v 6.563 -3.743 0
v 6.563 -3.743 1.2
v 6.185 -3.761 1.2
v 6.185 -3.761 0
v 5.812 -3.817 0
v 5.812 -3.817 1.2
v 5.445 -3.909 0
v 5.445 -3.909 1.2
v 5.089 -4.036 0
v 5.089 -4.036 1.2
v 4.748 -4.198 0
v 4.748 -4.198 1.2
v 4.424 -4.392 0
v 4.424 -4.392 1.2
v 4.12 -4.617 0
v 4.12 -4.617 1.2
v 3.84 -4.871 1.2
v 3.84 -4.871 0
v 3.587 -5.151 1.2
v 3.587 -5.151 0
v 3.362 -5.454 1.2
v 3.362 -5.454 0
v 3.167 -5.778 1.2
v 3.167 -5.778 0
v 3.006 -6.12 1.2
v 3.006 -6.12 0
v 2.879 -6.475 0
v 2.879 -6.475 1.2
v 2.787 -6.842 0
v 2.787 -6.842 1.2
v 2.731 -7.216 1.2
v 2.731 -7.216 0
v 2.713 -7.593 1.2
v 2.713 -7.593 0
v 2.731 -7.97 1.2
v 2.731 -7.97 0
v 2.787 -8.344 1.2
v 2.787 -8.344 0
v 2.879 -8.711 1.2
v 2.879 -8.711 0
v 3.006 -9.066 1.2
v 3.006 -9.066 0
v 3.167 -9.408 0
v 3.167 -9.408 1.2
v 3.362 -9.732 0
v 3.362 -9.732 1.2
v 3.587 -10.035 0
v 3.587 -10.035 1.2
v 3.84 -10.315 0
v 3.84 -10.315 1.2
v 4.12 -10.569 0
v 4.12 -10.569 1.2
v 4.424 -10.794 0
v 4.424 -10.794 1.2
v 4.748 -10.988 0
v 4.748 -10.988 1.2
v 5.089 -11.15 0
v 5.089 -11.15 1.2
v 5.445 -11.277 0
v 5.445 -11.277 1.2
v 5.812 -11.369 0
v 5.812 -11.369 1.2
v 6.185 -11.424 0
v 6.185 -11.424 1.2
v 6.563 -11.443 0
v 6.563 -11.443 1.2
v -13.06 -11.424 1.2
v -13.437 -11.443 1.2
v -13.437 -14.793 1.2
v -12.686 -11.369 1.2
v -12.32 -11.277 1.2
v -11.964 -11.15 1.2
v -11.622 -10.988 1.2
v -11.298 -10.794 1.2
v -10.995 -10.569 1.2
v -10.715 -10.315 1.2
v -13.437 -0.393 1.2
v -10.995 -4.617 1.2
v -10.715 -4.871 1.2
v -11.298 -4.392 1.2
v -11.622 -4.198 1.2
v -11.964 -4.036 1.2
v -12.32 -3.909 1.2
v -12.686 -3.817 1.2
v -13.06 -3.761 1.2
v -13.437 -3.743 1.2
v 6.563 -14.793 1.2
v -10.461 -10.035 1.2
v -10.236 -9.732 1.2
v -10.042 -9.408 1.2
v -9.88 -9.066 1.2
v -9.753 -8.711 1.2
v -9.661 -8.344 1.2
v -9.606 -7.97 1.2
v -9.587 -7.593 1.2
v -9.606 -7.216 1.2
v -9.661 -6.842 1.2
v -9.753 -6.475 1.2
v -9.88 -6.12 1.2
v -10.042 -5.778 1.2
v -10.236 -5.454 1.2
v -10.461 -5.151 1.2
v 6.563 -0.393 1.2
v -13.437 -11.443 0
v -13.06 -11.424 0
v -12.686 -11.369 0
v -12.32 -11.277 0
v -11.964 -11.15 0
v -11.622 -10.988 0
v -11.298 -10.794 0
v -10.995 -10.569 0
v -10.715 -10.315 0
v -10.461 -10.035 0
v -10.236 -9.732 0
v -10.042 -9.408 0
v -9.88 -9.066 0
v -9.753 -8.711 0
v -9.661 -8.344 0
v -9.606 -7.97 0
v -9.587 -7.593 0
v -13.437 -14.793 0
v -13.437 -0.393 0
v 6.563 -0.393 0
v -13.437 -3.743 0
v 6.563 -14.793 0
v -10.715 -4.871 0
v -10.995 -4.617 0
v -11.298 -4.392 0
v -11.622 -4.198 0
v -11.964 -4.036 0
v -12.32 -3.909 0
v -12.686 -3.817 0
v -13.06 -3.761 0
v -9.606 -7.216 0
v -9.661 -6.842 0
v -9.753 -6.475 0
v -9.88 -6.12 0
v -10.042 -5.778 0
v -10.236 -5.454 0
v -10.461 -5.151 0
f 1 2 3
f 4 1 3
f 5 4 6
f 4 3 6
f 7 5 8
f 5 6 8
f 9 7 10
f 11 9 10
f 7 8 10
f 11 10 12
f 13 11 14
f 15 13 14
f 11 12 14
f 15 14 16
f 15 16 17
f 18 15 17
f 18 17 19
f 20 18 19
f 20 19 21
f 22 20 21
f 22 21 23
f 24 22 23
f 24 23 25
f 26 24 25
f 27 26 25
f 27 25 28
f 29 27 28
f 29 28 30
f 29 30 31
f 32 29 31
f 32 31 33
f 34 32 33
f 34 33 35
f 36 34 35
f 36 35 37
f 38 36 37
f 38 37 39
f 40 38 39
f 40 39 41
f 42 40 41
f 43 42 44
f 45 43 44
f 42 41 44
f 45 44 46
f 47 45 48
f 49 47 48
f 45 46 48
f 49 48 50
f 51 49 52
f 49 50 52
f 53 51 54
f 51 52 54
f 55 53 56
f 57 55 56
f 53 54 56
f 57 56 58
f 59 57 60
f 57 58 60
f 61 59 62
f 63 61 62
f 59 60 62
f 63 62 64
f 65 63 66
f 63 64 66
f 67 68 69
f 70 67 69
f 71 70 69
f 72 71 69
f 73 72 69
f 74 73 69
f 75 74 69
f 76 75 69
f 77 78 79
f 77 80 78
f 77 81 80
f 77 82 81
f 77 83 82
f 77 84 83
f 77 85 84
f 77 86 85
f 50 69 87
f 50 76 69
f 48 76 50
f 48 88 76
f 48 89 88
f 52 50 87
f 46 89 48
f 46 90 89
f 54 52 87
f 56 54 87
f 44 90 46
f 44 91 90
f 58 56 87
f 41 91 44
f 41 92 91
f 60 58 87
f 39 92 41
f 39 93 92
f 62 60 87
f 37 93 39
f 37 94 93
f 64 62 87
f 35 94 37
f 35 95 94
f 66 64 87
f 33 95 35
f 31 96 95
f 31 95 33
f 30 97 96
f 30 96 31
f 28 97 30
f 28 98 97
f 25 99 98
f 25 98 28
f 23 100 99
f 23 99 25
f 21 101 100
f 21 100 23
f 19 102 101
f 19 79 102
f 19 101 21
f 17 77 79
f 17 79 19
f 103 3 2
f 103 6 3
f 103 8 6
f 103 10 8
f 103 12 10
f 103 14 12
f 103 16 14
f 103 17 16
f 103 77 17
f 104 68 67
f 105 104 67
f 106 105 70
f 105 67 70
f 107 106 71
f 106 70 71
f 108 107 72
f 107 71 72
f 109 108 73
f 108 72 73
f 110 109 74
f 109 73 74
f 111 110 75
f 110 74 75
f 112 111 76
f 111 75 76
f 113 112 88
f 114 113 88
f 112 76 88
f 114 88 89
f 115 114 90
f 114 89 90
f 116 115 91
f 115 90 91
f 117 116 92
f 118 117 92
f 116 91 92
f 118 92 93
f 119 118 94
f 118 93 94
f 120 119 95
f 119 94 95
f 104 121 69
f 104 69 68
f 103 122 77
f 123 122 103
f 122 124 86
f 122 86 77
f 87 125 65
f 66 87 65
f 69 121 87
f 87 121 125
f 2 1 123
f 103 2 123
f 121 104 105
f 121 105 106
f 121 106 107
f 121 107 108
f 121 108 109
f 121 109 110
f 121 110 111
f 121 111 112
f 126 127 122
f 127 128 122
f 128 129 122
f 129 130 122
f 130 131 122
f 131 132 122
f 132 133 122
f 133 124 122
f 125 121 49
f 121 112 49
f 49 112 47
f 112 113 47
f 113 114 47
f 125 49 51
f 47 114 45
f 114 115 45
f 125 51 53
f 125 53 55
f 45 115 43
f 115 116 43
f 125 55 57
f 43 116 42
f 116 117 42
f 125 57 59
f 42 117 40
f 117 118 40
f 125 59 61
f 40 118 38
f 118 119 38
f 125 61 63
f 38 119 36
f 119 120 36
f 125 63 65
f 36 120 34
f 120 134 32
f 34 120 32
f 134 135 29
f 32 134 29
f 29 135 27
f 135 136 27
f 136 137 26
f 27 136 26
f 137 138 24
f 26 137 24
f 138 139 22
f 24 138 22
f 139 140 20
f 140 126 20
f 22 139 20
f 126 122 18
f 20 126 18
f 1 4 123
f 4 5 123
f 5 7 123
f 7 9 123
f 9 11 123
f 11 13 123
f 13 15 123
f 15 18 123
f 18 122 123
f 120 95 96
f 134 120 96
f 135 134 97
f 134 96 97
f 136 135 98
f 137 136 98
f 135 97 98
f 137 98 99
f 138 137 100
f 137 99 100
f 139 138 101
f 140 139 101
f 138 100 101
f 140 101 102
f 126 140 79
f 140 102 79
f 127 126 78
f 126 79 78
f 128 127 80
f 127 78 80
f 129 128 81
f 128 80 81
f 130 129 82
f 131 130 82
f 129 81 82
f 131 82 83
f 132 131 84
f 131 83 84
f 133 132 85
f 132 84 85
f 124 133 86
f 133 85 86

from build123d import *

# Parameters (mm, degrees)
F0_W     = 20
F0_H     = 14.4
F1_DEPTH = 1.2
F3_DEPTH = 25.4


with BuildPart() as f1:
    # F0 (on Top) → F1 (new body)
    with BuildSketch(Plane.XY):
        with Locations((-3.4372447997, -7.5929352783)):
            Rectangle(F0_W, F0_H)
    extrude(amount=F1_DEPTH)

    # F2 (on face) → F3 (cut)
    with BuildSketch(Plane.XY.offset(1.2)):
        with BuildLine():
            ThreePointArc((-13.4372447997, -11.4429352783), (-10.7148836922, -10.3152963859), (-9.5872447997, -7.5929352783))
            ThreePointArc((-9.5872447997, -7.5929352783), (-10.7148836922, -4.8705741708), (-13.4372447997, -3.7429352783))
            Line((-13.4372447997, -3.7429352783), (-13.4372447997, -11.4429352783))
        make_face()
        with BuildLine():
            Line((6.5627552003, -11.4429352783), (6.5627552003, -3.7429352783))
            ThreePointArc((6.5627552003, -3.7429352783), (2.7127552003, -7.5929352783), (6.5627552003, -11.4429352783))
        make_face()
    extrude(amount=-F3_DEPTH, mode=Mode.SUBTRACT)


solid = f1.part
